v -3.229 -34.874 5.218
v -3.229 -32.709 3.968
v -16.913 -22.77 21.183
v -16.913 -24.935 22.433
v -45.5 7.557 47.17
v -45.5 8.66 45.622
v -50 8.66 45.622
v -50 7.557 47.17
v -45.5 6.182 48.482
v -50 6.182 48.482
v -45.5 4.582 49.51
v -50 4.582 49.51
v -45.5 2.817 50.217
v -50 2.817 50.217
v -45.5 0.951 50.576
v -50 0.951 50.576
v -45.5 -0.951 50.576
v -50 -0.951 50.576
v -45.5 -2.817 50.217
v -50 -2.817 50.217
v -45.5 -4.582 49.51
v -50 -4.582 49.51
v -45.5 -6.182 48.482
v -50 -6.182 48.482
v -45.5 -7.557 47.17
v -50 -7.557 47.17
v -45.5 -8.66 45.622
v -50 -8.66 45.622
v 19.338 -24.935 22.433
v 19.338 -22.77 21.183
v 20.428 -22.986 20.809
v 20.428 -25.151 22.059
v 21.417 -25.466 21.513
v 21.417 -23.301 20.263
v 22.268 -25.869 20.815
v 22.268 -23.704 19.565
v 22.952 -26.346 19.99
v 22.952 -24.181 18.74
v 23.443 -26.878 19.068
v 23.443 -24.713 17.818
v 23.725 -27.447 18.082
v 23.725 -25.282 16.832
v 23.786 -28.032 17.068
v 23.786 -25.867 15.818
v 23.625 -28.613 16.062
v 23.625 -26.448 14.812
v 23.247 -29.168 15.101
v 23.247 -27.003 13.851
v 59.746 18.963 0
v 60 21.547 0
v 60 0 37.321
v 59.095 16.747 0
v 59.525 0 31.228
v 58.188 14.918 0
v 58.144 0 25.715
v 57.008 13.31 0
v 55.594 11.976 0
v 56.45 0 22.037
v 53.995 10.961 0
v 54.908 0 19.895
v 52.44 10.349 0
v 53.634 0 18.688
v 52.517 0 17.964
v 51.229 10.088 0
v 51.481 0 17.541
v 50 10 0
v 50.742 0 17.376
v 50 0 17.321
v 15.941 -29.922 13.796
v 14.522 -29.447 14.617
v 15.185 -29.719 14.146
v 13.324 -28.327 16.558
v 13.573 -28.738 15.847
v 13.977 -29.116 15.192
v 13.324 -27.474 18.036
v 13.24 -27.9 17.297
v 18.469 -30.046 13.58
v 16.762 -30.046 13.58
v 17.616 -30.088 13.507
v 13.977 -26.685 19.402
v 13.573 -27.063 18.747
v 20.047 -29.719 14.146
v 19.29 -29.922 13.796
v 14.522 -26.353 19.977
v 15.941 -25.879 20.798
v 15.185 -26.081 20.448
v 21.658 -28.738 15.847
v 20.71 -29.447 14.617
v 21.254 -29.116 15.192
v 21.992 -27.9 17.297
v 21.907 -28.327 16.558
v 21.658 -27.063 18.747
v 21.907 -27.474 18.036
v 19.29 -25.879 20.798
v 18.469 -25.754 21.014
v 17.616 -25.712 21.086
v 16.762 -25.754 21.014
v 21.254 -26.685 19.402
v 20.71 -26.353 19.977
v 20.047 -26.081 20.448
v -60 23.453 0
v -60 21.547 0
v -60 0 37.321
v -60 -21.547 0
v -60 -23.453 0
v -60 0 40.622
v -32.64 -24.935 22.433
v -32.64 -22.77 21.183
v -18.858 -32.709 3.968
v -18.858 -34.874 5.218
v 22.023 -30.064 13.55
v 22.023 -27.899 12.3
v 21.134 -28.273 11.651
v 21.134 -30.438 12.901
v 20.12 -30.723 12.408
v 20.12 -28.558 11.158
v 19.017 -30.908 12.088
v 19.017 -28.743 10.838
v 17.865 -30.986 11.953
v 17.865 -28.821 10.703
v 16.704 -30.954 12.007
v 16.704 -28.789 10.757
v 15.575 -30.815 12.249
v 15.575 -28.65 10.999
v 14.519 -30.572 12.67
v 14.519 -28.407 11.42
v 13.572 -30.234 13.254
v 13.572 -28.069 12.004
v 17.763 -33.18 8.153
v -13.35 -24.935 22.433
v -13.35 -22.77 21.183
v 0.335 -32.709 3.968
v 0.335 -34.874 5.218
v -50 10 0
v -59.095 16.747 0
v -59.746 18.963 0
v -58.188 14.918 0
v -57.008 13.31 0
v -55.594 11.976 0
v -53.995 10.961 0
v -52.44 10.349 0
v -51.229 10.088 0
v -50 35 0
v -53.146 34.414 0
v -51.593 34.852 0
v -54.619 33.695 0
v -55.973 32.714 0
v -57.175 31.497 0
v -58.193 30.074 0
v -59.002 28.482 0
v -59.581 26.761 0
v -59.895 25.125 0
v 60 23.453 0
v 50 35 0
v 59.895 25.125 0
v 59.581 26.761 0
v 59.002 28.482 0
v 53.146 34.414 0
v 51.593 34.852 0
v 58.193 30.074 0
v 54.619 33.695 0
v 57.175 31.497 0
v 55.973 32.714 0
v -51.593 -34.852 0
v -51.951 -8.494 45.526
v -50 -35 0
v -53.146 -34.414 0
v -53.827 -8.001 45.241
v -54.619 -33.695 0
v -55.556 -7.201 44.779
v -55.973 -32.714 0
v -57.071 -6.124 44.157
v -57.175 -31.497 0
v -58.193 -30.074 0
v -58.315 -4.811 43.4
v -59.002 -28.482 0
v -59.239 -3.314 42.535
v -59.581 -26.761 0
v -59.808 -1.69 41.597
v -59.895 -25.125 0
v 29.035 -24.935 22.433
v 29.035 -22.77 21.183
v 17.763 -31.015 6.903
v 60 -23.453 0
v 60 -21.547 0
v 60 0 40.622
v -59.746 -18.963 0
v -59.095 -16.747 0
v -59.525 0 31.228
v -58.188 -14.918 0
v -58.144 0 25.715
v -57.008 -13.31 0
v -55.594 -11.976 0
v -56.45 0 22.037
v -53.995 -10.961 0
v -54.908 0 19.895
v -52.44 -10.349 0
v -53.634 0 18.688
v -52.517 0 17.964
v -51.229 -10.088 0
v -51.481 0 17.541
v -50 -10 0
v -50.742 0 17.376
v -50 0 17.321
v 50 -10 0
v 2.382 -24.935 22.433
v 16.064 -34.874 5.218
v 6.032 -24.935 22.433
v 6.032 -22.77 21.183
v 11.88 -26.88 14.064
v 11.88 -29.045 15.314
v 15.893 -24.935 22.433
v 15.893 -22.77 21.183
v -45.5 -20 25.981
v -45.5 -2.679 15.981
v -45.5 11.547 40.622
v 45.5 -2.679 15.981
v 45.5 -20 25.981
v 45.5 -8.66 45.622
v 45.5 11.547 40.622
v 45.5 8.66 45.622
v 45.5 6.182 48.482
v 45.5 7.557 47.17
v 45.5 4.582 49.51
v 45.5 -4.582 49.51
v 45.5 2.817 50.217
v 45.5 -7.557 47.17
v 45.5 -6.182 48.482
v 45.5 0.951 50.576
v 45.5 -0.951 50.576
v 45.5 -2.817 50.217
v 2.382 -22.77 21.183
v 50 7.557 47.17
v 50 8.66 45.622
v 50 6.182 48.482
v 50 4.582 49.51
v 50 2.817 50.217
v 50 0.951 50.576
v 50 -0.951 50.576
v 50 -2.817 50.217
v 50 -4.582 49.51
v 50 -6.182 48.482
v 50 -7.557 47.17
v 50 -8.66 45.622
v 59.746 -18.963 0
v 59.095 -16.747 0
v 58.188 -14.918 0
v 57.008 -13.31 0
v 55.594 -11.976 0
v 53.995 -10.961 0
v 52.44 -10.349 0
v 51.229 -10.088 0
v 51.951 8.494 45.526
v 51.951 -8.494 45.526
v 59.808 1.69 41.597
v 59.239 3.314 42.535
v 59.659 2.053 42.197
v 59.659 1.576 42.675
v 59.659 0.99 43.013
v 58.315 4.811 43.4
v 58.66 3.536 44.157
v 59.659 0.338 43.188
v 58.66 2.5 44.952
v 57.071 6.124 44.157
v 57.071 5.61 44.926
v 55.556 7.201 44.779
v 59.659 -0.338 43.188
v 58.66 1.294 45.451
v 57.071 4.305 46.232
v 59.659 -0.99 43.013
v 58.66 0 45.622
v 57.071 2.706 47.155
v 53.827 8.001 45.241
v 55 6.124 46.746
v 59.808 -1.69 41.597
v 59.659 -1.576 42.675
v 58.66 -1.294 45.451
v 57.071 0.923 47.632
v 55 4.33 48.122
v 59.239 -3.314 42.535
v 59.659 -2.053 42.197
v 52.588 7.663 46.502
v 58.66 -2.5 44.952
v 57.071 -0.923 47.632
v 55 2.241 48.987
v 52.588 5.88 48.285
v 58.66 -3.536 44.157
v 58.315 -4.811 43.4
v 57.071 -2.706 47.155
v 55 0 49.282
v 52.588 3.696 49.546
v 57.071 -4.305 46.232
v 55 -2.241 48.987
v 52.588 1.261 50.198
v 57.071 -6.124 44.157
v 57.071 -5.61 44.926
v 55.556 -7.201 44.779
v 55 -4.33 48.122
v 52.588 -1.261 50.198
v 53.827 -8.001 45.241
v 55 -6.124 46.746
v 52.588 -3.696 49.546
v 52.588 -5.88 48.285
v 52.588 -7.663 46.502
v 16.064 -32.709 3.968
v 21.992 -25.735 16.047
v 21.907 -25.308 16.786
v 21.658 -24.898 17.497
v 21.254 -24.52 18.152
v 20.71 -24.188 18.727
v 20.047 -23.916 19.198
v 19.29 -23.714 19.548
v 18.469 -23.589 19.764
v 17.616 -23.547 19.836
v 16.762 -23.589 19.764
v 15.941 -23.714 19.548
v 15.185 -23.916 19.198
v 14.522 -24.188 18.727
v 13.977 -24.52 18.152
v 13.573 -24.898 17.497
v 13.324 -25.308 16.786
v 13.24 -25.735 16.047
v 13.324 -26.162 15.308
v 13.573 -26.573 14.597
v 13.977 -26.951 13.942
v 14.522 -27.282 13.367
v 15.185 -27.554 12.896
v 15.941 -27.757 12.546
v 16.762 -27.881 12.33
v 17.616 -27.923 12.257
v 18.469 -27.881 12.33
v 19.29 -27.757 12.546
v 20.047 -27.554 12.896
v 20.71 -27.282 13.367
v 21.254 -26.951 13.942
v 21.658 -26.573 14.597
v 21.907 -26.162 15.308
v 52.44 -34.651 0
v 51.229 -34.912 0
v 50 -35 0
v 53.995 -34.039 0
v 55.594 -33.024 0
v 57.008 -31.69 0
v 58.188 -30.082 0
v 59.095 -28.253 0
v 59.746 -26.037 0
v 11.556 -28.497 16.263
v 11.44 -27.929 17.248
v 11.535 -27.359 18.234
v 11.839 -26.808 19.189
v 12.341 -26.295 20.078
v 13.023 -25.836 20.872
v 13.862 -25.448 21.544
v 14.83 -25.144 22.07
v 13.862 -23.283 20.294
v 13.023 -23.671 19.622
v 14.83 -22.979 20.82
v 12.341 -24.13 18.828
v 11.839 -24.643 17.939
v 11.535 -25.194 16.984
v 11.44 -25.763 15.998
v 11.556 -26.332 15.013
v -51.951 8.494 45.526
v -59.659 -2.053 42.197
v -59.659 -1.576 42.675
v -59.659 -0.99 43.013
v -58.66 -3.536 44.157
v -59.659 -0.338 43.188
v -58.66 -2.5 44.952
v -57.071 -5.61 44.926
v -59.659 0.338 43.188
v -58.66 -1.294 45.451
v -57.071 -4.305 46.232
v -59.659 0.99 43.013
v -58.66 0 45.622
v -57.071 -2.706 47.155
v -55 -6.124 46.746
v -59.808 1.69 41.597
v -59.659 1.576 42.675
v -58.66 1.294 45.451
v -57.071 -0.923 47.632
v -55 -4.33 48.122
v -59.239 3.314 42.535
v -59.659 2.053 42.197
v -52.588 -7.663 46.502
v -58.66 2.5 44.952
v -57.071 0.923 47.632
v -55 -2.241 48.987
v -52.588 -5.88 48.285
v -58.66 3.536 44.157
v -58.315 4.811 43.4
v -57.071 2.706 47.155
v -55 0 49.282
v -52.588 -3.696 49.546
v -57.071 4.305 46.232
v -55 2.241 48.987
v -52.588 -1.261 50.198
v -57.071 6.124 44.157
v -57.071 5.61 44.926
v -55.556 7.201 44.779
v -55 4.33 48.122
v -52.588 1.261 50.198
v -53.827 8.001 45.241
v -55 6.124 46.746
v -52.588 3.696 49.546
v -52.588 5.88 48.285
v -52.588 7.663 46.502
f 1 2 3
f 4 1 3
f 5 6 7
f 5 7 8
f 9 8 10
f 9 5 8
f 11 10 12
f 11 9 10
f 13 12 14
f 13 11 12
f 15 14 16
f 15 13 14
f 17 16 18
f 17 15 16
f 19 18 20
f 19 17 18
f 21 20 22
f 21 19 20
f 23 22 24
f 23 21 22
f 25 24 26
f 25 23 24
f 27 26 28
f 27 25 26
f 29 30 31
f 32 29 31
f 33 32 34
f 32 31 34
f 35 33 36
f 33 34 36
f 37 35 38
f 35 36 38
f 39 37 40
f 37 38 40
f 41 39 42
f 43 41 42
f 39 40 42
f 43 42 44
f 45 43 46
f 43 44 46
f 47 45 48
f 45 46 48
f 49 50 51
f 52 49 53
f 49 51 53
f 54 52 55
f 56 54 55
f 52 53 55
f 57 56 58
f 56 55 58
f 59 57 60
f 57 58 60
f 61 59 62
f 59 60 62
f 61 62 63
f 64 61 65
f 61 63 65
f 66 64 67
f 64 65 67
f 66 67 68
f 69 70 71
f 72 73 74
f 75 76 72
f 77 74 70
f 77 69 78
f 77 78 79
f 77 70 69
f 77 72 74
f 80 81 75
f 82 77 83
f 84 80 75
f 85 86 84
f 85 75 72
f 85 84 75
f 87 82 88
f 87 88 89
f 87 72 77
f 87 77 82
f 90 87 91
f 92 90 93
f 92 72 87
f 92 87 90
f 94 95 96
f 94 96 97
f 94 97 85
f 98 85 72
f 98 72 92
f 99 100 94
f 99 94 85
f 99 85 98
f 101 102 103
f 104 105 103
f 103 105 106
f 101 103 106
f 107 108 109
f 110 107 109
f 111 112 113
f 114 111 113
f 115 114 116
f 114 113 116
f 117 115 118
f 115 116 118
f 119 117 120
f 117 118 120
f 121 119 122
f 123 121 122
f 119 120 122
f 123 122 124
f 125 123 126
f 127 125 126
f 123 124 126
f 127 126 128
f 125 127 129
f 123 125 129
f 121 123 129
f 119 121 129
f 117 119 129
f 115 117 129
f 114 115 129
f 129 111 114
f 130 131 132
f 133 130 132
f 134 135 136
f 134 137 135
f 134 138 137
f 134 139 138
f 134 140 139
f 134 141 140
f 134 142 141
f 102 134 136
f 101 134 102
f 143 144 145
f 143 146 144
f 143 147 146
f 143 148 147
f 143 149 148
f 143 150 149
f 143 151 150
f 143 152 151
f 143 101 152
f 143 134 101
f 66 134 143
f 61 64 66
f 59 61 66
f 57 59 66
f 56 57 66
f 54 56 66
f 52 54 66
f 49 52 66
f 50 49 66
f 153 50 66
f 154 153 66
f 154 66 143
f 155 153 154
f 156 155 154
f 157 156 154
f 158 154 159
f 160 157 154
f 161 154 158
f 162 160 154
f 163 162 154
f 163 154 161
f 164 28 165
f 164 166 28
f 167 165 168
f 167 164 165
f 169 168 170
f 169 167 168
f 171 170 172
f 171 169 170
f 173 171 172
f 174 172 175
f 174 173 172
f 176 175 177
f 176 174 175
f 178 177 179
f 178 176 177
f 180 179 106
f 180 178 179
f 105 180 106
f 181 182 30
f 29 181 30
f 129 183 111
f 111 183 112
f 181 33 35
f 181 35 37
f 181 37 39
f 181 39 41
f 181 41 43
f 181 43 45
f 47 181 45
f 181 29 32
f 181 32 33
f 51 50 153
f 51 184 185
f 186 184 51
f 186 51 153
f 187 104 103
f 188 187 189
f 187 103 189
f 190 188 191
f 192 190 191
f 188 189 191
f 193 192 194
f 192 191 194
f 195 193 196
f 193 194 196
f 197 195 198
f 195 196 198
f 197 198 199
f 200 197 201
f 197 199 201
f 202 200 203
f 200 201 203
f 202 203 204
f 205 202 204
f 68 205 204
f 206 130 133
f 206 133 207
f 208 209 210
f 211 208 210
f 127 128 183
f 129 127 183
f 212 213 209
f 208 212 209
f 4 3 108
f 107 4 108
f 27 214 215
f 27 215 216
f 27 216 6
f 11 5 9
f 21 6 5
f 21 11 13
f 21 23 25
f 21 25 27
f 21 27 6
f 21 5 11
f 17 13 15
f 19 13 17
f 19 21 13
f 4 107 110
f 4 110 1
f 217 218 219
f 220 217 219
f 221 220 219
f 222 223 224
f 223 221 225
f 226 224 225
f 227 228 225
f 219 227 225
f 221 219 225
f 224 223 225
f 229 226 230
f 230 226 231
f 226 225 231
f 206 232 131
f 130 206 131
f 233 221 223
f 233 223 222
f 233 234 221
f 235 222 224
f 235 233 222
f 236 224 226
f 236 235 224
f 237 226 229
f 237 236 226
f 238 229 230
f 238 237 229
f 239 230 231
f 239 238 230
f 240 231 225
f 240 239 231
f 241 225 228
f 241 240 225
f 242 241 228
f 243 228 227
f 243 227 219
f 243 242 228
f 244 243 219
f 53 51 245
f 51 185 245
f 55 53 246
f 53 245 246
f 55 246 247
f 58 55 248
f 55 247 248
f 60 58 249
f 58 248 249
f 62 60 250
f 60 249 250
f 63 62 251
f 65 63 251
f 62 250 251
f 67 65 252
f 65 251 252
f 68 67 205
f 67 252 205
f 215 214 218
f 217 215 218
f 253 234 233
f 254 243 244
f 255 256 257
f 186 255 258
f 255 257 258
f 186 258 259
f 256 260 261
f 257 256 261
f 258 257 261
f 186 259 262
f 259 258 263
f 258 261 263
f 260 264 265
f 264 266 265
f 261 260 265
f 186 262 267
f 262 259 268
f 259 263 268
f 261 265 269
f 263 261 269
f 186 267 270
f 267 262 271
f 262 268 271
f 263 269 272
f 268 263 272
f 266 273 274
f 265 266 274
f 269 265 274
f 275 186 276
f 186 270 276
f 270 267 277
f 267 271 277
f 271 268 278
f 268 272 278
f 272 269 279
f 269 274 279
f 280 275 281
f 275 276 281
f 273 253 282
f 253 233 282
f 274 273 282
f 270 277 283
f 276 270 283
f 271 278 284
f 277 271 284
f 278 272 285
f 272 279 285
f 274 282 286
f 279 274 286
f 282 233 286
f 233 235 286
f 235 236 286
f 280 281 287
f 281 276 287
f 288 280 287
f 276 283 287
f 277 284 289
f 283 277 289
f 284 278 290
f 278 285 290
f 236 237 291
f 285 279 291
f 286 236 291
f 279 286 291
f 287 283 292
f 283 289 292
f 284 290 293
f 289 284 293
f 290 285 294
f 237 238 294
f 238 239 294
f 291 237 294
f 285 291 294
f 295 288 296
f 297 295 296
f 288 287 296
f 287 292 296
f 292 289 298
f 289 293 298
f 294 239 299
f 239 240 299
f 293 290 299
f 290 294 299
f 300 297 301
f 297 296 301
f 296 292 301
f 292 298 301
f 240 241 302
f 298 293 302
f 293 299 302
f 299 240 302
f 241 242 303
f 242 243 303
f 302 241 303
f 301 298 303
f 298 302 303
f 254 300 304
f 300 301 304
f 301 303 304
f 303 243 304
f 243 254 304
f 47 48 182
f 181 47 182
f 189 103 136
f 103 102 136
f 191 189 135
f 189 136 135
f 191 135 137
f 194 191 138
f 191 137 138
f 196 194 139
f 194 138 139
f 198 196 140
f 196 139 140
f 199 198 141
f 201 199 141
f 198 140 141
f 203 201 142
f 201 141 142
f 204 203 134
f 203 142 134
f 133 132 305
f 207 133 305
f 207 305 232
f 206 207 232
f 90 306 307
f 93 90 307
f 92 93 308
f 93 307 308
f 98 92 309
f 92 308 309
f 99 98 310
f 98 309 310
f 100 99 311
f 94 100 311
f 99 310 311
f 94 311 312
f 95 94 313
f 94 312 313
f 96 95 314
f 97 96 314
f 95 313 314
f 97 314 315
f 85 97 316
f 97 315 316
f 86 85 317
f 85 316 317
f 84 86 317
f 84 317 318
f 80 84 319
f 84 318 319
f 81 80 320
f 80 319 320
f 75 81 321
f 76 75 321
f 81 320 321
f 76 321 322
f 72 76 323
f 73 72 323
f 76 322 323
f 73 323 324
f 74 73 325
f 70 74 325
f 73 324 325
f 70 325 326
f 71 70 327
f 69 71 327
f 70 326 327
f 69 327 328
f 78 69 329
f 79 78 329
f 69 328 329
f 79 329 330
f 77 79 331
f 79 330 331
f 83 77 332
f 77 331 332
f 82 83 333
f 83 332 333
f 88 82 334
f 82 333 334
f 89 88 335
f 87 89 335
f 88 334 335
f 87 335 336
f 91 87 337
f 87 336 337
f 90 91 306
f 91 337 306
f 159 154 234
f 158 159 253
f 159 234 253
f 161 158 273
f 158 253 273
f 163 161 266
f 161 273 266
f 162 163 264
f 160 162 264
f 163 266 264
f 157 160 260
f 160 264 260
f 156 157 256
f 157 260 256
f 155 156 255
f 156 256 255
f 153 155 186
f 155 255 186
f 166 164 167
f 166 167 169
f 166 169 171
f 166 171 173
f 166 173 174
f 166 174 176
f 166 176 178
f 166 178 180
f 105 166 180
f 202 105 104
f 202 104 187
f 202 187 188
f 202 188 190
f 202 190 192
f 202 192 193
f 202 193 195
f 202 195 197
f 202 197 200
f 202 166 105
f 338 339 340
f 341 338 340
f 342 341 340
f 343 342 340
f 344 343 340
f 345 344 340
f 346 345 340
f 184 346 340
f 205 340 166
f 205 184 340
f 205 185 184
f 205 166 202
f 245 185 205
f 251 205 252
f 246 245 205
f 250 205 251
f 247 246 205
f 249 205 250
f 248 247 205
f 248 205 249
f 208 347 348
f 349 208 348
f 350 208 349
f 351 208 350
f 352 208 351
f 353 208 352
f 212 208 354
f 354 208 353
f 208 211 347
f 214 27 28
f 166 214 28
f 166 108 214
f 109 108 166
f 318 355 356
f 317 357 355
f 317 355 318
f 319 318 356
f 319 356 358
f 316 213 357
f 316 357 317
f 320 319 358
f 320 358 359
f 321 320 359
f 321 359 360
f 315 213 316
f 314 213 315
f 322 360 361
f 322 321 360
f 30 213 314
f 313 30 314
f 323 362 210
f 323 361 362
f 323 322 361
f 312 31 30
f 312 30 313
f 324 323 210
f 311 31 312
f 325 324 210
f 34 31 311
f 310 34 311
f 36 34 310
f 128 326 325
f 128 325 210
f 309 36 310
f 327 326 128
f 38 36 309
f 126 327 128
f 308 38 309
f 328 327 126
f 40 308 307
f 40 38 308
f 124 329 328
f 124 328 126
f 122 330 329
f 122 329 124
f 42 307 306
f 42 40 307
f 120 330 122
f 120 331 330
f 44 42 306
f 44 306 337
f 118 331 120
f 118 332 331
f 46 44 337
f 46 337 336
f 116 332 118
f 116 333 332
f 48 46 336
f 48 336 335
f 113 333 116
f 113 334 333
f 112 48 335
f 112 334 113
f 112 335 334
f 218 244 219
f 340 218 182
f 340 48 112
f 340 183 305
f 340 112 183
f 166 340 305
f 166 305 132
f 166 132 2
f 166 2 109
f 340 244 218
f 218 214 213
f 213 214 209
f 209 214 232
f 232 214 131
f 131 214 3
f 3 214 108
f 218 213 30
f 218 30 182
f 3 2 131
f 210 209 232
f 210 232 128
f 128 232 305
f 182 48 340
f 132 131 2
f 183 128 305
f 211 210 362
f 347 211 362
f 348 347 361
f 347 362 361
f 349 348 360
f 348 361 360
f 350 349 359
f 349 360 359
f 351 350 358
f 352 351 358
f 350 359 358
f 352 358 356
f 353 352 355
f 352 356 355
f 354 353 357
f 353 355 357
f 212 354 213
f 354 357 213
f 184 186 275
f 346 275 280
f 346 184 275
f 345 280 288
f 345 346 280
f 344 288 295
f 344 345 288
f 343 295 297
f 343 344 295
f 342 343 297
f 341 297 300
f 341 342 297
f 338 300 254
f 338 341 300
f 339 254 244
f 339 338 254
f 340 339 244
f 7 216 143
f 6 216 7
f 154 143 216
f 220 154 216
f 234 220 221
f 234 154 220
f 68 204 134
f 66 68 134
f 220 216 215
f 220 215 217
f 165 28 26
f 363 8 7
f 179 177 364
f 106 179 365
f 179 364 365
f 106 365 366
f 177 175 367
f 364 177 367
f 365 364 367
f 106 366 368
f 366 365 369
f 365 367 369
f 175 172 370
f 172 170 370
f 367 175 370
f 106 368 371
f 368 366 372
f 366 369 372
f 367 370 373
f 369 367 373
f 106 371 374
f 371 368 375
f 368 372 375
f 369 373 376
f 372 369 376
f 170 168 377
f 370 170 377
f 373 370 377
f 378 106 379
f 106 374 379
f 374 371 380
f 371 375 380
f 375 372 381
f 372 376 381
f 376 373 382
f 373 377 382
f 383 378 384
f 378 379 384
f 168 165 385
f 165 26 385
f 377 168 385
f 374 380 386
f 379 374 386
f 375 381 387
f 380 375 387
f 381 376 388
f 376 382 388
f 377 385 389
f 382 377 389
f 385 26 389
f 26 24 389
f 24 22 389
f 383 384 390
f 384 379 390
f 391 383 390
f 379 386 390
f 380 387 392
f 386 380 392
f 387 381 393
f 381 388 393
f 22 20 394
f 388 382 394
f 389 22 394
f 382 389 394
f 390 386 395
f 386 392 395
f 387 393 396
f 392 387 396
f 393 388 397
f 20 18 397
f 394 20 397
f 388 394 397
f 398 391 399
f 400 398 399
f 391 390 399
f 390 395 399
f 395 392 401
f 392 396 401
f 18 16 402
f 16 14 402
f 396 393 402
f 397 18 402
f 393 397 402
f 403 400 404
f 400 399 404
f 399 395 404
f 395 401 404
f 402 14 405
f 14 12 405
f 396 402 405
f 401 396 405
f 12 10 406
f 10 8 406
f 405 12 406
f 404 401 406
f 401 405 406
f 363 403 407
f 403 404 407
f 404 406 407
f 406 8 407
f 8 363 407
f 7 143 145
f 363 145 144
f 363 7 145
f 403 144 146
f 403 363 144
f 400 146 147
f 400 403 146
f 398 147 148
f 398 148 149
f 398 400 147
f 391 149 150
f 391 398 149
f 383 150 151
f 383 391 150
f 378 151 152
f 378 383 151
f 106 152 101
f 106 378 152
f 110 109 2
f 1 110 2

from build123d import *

# Parameters (mm, degrees)
F1_DEPTH = 60
F2_W     = 91
F2_H     = 40
F3_DEPTH = 20
F4_R     = 4.3757639441
F5_DEPTH = 2.5
F7_DEPTH = 120.001
F8_R     = 10


with BuildPart() as f1:
    # F0 (on Right) → F1 (new body, symmetric)
    with BuildSketch(Plane.YZ):
        Polygon((35, 0), (0, 60.6217782649), (-35, 0), align=None)
    extrude(amount=F1_DEPTH, both=True)

    # F2 (on face) → F3 (cut)
    with BuildSketch(Plane(origin=(0, -26.25, 15.1554445662), x_dir=(1, 0, 0), z_dir=(0, -0.8660254038, 0.5))):
        with Locations((0, 32.5)):
            Rectangle(F2_W, F2_H)
    extrude(amount=-F3_DEPTH, mode=Mode.SUBTRACT)

    # F4 (on face) → F5 (join)
    with BuildSketch(Plane(origin=(0, -26.25, 15.1554445662), x_dir=(1, 0, 0), z_dir=(0, -0.8660254038, 0.5))):
        Polygon((-16.9133506715, 6.9602951407), (-32.6403528452, 6.9602951407), (-18.8582409173, -12.9176480696), (-3.2289559022, -12.9176480696), align=None)
        Polygon((2.3815555032, 6.9602951407), (-13.3497389033, 6.9602951407), (0.334655866, -12.9176480696), (16.0643365234, -12.9176480696), align=None)
        with BuildLine():
            Line((15.8933419219, 6.9602951407), (6.0318070464, 6.9602951407))
            Line((6.0318070464, 6.9602951407), (11.8799349226, -1.2600759071))
            ThreePointArc((11.8799349226, -1.2600759071), (12.0659931402, 3.7389977797), (15.8933419219, 6.9602951407))
        make_face()
        with Locations((17.6157766381, 1.0294436968)):
            Circle(F4_R)
        with BuildLine():
            Line((23.2472105613, -1.5060507656), (29.0346425027, 6.9602951407))
            Line((29.0346425027, 6.9602951407), (19.3382113542, 6.9602951407))
            ThreePointArc((19.3382113542, 6.9602951407), (23.2228792092, 3.6183007725), (23.2472105613, -1.5060507656))
        make_face()
        with BuildLine():
            Line((13.5719669058, -3.6384662263), (17.7627429366, -9.5291947946))
            Line((17.7627429366, -9.5291947946), (22.0228294821, -3.29717917))
            ThreePointArc((22.0228294821, -3.29717917), (17.8649865963, -5.1414293855), (13.5719669058, -3.6384662263))
        make_face()
    extrude(amount=F5_DEPTH)

    # F6 (on face) → F7 (cut, through all)
    with BuildSketch(Plane(origin=(-60, 0, 0), x_dir=(0, -1, 0), z_dir=(-1, 0, 0))):
        Polygon((10, 0), (0, 17.3205080757), (-10, 0), align=None)
    extrude(amount=-F7_DEPTH, mode=Mode.SUBTRACT)

    # F8
    f8_edges = [f1.edges().sort_by_distance(p)[0] for p in [
        (52.75, 0, 60.621778),
        (-52.75, 0, 60.621778),
        (-60, -17.5, 30.310889),
        (60, 17.5, 30.310889),
        (60, -17.5, 30.310889),
        (-60, 17.5, 30.310889),
        (-60, -5, 8.660254),
        (-60, 5, 8.660254),
        (60, -5, 8.660254),
        (60, 5, 8.660254),
    ]]
    fillet(f8_edges, radius=F8_R)


solid = f1.part
